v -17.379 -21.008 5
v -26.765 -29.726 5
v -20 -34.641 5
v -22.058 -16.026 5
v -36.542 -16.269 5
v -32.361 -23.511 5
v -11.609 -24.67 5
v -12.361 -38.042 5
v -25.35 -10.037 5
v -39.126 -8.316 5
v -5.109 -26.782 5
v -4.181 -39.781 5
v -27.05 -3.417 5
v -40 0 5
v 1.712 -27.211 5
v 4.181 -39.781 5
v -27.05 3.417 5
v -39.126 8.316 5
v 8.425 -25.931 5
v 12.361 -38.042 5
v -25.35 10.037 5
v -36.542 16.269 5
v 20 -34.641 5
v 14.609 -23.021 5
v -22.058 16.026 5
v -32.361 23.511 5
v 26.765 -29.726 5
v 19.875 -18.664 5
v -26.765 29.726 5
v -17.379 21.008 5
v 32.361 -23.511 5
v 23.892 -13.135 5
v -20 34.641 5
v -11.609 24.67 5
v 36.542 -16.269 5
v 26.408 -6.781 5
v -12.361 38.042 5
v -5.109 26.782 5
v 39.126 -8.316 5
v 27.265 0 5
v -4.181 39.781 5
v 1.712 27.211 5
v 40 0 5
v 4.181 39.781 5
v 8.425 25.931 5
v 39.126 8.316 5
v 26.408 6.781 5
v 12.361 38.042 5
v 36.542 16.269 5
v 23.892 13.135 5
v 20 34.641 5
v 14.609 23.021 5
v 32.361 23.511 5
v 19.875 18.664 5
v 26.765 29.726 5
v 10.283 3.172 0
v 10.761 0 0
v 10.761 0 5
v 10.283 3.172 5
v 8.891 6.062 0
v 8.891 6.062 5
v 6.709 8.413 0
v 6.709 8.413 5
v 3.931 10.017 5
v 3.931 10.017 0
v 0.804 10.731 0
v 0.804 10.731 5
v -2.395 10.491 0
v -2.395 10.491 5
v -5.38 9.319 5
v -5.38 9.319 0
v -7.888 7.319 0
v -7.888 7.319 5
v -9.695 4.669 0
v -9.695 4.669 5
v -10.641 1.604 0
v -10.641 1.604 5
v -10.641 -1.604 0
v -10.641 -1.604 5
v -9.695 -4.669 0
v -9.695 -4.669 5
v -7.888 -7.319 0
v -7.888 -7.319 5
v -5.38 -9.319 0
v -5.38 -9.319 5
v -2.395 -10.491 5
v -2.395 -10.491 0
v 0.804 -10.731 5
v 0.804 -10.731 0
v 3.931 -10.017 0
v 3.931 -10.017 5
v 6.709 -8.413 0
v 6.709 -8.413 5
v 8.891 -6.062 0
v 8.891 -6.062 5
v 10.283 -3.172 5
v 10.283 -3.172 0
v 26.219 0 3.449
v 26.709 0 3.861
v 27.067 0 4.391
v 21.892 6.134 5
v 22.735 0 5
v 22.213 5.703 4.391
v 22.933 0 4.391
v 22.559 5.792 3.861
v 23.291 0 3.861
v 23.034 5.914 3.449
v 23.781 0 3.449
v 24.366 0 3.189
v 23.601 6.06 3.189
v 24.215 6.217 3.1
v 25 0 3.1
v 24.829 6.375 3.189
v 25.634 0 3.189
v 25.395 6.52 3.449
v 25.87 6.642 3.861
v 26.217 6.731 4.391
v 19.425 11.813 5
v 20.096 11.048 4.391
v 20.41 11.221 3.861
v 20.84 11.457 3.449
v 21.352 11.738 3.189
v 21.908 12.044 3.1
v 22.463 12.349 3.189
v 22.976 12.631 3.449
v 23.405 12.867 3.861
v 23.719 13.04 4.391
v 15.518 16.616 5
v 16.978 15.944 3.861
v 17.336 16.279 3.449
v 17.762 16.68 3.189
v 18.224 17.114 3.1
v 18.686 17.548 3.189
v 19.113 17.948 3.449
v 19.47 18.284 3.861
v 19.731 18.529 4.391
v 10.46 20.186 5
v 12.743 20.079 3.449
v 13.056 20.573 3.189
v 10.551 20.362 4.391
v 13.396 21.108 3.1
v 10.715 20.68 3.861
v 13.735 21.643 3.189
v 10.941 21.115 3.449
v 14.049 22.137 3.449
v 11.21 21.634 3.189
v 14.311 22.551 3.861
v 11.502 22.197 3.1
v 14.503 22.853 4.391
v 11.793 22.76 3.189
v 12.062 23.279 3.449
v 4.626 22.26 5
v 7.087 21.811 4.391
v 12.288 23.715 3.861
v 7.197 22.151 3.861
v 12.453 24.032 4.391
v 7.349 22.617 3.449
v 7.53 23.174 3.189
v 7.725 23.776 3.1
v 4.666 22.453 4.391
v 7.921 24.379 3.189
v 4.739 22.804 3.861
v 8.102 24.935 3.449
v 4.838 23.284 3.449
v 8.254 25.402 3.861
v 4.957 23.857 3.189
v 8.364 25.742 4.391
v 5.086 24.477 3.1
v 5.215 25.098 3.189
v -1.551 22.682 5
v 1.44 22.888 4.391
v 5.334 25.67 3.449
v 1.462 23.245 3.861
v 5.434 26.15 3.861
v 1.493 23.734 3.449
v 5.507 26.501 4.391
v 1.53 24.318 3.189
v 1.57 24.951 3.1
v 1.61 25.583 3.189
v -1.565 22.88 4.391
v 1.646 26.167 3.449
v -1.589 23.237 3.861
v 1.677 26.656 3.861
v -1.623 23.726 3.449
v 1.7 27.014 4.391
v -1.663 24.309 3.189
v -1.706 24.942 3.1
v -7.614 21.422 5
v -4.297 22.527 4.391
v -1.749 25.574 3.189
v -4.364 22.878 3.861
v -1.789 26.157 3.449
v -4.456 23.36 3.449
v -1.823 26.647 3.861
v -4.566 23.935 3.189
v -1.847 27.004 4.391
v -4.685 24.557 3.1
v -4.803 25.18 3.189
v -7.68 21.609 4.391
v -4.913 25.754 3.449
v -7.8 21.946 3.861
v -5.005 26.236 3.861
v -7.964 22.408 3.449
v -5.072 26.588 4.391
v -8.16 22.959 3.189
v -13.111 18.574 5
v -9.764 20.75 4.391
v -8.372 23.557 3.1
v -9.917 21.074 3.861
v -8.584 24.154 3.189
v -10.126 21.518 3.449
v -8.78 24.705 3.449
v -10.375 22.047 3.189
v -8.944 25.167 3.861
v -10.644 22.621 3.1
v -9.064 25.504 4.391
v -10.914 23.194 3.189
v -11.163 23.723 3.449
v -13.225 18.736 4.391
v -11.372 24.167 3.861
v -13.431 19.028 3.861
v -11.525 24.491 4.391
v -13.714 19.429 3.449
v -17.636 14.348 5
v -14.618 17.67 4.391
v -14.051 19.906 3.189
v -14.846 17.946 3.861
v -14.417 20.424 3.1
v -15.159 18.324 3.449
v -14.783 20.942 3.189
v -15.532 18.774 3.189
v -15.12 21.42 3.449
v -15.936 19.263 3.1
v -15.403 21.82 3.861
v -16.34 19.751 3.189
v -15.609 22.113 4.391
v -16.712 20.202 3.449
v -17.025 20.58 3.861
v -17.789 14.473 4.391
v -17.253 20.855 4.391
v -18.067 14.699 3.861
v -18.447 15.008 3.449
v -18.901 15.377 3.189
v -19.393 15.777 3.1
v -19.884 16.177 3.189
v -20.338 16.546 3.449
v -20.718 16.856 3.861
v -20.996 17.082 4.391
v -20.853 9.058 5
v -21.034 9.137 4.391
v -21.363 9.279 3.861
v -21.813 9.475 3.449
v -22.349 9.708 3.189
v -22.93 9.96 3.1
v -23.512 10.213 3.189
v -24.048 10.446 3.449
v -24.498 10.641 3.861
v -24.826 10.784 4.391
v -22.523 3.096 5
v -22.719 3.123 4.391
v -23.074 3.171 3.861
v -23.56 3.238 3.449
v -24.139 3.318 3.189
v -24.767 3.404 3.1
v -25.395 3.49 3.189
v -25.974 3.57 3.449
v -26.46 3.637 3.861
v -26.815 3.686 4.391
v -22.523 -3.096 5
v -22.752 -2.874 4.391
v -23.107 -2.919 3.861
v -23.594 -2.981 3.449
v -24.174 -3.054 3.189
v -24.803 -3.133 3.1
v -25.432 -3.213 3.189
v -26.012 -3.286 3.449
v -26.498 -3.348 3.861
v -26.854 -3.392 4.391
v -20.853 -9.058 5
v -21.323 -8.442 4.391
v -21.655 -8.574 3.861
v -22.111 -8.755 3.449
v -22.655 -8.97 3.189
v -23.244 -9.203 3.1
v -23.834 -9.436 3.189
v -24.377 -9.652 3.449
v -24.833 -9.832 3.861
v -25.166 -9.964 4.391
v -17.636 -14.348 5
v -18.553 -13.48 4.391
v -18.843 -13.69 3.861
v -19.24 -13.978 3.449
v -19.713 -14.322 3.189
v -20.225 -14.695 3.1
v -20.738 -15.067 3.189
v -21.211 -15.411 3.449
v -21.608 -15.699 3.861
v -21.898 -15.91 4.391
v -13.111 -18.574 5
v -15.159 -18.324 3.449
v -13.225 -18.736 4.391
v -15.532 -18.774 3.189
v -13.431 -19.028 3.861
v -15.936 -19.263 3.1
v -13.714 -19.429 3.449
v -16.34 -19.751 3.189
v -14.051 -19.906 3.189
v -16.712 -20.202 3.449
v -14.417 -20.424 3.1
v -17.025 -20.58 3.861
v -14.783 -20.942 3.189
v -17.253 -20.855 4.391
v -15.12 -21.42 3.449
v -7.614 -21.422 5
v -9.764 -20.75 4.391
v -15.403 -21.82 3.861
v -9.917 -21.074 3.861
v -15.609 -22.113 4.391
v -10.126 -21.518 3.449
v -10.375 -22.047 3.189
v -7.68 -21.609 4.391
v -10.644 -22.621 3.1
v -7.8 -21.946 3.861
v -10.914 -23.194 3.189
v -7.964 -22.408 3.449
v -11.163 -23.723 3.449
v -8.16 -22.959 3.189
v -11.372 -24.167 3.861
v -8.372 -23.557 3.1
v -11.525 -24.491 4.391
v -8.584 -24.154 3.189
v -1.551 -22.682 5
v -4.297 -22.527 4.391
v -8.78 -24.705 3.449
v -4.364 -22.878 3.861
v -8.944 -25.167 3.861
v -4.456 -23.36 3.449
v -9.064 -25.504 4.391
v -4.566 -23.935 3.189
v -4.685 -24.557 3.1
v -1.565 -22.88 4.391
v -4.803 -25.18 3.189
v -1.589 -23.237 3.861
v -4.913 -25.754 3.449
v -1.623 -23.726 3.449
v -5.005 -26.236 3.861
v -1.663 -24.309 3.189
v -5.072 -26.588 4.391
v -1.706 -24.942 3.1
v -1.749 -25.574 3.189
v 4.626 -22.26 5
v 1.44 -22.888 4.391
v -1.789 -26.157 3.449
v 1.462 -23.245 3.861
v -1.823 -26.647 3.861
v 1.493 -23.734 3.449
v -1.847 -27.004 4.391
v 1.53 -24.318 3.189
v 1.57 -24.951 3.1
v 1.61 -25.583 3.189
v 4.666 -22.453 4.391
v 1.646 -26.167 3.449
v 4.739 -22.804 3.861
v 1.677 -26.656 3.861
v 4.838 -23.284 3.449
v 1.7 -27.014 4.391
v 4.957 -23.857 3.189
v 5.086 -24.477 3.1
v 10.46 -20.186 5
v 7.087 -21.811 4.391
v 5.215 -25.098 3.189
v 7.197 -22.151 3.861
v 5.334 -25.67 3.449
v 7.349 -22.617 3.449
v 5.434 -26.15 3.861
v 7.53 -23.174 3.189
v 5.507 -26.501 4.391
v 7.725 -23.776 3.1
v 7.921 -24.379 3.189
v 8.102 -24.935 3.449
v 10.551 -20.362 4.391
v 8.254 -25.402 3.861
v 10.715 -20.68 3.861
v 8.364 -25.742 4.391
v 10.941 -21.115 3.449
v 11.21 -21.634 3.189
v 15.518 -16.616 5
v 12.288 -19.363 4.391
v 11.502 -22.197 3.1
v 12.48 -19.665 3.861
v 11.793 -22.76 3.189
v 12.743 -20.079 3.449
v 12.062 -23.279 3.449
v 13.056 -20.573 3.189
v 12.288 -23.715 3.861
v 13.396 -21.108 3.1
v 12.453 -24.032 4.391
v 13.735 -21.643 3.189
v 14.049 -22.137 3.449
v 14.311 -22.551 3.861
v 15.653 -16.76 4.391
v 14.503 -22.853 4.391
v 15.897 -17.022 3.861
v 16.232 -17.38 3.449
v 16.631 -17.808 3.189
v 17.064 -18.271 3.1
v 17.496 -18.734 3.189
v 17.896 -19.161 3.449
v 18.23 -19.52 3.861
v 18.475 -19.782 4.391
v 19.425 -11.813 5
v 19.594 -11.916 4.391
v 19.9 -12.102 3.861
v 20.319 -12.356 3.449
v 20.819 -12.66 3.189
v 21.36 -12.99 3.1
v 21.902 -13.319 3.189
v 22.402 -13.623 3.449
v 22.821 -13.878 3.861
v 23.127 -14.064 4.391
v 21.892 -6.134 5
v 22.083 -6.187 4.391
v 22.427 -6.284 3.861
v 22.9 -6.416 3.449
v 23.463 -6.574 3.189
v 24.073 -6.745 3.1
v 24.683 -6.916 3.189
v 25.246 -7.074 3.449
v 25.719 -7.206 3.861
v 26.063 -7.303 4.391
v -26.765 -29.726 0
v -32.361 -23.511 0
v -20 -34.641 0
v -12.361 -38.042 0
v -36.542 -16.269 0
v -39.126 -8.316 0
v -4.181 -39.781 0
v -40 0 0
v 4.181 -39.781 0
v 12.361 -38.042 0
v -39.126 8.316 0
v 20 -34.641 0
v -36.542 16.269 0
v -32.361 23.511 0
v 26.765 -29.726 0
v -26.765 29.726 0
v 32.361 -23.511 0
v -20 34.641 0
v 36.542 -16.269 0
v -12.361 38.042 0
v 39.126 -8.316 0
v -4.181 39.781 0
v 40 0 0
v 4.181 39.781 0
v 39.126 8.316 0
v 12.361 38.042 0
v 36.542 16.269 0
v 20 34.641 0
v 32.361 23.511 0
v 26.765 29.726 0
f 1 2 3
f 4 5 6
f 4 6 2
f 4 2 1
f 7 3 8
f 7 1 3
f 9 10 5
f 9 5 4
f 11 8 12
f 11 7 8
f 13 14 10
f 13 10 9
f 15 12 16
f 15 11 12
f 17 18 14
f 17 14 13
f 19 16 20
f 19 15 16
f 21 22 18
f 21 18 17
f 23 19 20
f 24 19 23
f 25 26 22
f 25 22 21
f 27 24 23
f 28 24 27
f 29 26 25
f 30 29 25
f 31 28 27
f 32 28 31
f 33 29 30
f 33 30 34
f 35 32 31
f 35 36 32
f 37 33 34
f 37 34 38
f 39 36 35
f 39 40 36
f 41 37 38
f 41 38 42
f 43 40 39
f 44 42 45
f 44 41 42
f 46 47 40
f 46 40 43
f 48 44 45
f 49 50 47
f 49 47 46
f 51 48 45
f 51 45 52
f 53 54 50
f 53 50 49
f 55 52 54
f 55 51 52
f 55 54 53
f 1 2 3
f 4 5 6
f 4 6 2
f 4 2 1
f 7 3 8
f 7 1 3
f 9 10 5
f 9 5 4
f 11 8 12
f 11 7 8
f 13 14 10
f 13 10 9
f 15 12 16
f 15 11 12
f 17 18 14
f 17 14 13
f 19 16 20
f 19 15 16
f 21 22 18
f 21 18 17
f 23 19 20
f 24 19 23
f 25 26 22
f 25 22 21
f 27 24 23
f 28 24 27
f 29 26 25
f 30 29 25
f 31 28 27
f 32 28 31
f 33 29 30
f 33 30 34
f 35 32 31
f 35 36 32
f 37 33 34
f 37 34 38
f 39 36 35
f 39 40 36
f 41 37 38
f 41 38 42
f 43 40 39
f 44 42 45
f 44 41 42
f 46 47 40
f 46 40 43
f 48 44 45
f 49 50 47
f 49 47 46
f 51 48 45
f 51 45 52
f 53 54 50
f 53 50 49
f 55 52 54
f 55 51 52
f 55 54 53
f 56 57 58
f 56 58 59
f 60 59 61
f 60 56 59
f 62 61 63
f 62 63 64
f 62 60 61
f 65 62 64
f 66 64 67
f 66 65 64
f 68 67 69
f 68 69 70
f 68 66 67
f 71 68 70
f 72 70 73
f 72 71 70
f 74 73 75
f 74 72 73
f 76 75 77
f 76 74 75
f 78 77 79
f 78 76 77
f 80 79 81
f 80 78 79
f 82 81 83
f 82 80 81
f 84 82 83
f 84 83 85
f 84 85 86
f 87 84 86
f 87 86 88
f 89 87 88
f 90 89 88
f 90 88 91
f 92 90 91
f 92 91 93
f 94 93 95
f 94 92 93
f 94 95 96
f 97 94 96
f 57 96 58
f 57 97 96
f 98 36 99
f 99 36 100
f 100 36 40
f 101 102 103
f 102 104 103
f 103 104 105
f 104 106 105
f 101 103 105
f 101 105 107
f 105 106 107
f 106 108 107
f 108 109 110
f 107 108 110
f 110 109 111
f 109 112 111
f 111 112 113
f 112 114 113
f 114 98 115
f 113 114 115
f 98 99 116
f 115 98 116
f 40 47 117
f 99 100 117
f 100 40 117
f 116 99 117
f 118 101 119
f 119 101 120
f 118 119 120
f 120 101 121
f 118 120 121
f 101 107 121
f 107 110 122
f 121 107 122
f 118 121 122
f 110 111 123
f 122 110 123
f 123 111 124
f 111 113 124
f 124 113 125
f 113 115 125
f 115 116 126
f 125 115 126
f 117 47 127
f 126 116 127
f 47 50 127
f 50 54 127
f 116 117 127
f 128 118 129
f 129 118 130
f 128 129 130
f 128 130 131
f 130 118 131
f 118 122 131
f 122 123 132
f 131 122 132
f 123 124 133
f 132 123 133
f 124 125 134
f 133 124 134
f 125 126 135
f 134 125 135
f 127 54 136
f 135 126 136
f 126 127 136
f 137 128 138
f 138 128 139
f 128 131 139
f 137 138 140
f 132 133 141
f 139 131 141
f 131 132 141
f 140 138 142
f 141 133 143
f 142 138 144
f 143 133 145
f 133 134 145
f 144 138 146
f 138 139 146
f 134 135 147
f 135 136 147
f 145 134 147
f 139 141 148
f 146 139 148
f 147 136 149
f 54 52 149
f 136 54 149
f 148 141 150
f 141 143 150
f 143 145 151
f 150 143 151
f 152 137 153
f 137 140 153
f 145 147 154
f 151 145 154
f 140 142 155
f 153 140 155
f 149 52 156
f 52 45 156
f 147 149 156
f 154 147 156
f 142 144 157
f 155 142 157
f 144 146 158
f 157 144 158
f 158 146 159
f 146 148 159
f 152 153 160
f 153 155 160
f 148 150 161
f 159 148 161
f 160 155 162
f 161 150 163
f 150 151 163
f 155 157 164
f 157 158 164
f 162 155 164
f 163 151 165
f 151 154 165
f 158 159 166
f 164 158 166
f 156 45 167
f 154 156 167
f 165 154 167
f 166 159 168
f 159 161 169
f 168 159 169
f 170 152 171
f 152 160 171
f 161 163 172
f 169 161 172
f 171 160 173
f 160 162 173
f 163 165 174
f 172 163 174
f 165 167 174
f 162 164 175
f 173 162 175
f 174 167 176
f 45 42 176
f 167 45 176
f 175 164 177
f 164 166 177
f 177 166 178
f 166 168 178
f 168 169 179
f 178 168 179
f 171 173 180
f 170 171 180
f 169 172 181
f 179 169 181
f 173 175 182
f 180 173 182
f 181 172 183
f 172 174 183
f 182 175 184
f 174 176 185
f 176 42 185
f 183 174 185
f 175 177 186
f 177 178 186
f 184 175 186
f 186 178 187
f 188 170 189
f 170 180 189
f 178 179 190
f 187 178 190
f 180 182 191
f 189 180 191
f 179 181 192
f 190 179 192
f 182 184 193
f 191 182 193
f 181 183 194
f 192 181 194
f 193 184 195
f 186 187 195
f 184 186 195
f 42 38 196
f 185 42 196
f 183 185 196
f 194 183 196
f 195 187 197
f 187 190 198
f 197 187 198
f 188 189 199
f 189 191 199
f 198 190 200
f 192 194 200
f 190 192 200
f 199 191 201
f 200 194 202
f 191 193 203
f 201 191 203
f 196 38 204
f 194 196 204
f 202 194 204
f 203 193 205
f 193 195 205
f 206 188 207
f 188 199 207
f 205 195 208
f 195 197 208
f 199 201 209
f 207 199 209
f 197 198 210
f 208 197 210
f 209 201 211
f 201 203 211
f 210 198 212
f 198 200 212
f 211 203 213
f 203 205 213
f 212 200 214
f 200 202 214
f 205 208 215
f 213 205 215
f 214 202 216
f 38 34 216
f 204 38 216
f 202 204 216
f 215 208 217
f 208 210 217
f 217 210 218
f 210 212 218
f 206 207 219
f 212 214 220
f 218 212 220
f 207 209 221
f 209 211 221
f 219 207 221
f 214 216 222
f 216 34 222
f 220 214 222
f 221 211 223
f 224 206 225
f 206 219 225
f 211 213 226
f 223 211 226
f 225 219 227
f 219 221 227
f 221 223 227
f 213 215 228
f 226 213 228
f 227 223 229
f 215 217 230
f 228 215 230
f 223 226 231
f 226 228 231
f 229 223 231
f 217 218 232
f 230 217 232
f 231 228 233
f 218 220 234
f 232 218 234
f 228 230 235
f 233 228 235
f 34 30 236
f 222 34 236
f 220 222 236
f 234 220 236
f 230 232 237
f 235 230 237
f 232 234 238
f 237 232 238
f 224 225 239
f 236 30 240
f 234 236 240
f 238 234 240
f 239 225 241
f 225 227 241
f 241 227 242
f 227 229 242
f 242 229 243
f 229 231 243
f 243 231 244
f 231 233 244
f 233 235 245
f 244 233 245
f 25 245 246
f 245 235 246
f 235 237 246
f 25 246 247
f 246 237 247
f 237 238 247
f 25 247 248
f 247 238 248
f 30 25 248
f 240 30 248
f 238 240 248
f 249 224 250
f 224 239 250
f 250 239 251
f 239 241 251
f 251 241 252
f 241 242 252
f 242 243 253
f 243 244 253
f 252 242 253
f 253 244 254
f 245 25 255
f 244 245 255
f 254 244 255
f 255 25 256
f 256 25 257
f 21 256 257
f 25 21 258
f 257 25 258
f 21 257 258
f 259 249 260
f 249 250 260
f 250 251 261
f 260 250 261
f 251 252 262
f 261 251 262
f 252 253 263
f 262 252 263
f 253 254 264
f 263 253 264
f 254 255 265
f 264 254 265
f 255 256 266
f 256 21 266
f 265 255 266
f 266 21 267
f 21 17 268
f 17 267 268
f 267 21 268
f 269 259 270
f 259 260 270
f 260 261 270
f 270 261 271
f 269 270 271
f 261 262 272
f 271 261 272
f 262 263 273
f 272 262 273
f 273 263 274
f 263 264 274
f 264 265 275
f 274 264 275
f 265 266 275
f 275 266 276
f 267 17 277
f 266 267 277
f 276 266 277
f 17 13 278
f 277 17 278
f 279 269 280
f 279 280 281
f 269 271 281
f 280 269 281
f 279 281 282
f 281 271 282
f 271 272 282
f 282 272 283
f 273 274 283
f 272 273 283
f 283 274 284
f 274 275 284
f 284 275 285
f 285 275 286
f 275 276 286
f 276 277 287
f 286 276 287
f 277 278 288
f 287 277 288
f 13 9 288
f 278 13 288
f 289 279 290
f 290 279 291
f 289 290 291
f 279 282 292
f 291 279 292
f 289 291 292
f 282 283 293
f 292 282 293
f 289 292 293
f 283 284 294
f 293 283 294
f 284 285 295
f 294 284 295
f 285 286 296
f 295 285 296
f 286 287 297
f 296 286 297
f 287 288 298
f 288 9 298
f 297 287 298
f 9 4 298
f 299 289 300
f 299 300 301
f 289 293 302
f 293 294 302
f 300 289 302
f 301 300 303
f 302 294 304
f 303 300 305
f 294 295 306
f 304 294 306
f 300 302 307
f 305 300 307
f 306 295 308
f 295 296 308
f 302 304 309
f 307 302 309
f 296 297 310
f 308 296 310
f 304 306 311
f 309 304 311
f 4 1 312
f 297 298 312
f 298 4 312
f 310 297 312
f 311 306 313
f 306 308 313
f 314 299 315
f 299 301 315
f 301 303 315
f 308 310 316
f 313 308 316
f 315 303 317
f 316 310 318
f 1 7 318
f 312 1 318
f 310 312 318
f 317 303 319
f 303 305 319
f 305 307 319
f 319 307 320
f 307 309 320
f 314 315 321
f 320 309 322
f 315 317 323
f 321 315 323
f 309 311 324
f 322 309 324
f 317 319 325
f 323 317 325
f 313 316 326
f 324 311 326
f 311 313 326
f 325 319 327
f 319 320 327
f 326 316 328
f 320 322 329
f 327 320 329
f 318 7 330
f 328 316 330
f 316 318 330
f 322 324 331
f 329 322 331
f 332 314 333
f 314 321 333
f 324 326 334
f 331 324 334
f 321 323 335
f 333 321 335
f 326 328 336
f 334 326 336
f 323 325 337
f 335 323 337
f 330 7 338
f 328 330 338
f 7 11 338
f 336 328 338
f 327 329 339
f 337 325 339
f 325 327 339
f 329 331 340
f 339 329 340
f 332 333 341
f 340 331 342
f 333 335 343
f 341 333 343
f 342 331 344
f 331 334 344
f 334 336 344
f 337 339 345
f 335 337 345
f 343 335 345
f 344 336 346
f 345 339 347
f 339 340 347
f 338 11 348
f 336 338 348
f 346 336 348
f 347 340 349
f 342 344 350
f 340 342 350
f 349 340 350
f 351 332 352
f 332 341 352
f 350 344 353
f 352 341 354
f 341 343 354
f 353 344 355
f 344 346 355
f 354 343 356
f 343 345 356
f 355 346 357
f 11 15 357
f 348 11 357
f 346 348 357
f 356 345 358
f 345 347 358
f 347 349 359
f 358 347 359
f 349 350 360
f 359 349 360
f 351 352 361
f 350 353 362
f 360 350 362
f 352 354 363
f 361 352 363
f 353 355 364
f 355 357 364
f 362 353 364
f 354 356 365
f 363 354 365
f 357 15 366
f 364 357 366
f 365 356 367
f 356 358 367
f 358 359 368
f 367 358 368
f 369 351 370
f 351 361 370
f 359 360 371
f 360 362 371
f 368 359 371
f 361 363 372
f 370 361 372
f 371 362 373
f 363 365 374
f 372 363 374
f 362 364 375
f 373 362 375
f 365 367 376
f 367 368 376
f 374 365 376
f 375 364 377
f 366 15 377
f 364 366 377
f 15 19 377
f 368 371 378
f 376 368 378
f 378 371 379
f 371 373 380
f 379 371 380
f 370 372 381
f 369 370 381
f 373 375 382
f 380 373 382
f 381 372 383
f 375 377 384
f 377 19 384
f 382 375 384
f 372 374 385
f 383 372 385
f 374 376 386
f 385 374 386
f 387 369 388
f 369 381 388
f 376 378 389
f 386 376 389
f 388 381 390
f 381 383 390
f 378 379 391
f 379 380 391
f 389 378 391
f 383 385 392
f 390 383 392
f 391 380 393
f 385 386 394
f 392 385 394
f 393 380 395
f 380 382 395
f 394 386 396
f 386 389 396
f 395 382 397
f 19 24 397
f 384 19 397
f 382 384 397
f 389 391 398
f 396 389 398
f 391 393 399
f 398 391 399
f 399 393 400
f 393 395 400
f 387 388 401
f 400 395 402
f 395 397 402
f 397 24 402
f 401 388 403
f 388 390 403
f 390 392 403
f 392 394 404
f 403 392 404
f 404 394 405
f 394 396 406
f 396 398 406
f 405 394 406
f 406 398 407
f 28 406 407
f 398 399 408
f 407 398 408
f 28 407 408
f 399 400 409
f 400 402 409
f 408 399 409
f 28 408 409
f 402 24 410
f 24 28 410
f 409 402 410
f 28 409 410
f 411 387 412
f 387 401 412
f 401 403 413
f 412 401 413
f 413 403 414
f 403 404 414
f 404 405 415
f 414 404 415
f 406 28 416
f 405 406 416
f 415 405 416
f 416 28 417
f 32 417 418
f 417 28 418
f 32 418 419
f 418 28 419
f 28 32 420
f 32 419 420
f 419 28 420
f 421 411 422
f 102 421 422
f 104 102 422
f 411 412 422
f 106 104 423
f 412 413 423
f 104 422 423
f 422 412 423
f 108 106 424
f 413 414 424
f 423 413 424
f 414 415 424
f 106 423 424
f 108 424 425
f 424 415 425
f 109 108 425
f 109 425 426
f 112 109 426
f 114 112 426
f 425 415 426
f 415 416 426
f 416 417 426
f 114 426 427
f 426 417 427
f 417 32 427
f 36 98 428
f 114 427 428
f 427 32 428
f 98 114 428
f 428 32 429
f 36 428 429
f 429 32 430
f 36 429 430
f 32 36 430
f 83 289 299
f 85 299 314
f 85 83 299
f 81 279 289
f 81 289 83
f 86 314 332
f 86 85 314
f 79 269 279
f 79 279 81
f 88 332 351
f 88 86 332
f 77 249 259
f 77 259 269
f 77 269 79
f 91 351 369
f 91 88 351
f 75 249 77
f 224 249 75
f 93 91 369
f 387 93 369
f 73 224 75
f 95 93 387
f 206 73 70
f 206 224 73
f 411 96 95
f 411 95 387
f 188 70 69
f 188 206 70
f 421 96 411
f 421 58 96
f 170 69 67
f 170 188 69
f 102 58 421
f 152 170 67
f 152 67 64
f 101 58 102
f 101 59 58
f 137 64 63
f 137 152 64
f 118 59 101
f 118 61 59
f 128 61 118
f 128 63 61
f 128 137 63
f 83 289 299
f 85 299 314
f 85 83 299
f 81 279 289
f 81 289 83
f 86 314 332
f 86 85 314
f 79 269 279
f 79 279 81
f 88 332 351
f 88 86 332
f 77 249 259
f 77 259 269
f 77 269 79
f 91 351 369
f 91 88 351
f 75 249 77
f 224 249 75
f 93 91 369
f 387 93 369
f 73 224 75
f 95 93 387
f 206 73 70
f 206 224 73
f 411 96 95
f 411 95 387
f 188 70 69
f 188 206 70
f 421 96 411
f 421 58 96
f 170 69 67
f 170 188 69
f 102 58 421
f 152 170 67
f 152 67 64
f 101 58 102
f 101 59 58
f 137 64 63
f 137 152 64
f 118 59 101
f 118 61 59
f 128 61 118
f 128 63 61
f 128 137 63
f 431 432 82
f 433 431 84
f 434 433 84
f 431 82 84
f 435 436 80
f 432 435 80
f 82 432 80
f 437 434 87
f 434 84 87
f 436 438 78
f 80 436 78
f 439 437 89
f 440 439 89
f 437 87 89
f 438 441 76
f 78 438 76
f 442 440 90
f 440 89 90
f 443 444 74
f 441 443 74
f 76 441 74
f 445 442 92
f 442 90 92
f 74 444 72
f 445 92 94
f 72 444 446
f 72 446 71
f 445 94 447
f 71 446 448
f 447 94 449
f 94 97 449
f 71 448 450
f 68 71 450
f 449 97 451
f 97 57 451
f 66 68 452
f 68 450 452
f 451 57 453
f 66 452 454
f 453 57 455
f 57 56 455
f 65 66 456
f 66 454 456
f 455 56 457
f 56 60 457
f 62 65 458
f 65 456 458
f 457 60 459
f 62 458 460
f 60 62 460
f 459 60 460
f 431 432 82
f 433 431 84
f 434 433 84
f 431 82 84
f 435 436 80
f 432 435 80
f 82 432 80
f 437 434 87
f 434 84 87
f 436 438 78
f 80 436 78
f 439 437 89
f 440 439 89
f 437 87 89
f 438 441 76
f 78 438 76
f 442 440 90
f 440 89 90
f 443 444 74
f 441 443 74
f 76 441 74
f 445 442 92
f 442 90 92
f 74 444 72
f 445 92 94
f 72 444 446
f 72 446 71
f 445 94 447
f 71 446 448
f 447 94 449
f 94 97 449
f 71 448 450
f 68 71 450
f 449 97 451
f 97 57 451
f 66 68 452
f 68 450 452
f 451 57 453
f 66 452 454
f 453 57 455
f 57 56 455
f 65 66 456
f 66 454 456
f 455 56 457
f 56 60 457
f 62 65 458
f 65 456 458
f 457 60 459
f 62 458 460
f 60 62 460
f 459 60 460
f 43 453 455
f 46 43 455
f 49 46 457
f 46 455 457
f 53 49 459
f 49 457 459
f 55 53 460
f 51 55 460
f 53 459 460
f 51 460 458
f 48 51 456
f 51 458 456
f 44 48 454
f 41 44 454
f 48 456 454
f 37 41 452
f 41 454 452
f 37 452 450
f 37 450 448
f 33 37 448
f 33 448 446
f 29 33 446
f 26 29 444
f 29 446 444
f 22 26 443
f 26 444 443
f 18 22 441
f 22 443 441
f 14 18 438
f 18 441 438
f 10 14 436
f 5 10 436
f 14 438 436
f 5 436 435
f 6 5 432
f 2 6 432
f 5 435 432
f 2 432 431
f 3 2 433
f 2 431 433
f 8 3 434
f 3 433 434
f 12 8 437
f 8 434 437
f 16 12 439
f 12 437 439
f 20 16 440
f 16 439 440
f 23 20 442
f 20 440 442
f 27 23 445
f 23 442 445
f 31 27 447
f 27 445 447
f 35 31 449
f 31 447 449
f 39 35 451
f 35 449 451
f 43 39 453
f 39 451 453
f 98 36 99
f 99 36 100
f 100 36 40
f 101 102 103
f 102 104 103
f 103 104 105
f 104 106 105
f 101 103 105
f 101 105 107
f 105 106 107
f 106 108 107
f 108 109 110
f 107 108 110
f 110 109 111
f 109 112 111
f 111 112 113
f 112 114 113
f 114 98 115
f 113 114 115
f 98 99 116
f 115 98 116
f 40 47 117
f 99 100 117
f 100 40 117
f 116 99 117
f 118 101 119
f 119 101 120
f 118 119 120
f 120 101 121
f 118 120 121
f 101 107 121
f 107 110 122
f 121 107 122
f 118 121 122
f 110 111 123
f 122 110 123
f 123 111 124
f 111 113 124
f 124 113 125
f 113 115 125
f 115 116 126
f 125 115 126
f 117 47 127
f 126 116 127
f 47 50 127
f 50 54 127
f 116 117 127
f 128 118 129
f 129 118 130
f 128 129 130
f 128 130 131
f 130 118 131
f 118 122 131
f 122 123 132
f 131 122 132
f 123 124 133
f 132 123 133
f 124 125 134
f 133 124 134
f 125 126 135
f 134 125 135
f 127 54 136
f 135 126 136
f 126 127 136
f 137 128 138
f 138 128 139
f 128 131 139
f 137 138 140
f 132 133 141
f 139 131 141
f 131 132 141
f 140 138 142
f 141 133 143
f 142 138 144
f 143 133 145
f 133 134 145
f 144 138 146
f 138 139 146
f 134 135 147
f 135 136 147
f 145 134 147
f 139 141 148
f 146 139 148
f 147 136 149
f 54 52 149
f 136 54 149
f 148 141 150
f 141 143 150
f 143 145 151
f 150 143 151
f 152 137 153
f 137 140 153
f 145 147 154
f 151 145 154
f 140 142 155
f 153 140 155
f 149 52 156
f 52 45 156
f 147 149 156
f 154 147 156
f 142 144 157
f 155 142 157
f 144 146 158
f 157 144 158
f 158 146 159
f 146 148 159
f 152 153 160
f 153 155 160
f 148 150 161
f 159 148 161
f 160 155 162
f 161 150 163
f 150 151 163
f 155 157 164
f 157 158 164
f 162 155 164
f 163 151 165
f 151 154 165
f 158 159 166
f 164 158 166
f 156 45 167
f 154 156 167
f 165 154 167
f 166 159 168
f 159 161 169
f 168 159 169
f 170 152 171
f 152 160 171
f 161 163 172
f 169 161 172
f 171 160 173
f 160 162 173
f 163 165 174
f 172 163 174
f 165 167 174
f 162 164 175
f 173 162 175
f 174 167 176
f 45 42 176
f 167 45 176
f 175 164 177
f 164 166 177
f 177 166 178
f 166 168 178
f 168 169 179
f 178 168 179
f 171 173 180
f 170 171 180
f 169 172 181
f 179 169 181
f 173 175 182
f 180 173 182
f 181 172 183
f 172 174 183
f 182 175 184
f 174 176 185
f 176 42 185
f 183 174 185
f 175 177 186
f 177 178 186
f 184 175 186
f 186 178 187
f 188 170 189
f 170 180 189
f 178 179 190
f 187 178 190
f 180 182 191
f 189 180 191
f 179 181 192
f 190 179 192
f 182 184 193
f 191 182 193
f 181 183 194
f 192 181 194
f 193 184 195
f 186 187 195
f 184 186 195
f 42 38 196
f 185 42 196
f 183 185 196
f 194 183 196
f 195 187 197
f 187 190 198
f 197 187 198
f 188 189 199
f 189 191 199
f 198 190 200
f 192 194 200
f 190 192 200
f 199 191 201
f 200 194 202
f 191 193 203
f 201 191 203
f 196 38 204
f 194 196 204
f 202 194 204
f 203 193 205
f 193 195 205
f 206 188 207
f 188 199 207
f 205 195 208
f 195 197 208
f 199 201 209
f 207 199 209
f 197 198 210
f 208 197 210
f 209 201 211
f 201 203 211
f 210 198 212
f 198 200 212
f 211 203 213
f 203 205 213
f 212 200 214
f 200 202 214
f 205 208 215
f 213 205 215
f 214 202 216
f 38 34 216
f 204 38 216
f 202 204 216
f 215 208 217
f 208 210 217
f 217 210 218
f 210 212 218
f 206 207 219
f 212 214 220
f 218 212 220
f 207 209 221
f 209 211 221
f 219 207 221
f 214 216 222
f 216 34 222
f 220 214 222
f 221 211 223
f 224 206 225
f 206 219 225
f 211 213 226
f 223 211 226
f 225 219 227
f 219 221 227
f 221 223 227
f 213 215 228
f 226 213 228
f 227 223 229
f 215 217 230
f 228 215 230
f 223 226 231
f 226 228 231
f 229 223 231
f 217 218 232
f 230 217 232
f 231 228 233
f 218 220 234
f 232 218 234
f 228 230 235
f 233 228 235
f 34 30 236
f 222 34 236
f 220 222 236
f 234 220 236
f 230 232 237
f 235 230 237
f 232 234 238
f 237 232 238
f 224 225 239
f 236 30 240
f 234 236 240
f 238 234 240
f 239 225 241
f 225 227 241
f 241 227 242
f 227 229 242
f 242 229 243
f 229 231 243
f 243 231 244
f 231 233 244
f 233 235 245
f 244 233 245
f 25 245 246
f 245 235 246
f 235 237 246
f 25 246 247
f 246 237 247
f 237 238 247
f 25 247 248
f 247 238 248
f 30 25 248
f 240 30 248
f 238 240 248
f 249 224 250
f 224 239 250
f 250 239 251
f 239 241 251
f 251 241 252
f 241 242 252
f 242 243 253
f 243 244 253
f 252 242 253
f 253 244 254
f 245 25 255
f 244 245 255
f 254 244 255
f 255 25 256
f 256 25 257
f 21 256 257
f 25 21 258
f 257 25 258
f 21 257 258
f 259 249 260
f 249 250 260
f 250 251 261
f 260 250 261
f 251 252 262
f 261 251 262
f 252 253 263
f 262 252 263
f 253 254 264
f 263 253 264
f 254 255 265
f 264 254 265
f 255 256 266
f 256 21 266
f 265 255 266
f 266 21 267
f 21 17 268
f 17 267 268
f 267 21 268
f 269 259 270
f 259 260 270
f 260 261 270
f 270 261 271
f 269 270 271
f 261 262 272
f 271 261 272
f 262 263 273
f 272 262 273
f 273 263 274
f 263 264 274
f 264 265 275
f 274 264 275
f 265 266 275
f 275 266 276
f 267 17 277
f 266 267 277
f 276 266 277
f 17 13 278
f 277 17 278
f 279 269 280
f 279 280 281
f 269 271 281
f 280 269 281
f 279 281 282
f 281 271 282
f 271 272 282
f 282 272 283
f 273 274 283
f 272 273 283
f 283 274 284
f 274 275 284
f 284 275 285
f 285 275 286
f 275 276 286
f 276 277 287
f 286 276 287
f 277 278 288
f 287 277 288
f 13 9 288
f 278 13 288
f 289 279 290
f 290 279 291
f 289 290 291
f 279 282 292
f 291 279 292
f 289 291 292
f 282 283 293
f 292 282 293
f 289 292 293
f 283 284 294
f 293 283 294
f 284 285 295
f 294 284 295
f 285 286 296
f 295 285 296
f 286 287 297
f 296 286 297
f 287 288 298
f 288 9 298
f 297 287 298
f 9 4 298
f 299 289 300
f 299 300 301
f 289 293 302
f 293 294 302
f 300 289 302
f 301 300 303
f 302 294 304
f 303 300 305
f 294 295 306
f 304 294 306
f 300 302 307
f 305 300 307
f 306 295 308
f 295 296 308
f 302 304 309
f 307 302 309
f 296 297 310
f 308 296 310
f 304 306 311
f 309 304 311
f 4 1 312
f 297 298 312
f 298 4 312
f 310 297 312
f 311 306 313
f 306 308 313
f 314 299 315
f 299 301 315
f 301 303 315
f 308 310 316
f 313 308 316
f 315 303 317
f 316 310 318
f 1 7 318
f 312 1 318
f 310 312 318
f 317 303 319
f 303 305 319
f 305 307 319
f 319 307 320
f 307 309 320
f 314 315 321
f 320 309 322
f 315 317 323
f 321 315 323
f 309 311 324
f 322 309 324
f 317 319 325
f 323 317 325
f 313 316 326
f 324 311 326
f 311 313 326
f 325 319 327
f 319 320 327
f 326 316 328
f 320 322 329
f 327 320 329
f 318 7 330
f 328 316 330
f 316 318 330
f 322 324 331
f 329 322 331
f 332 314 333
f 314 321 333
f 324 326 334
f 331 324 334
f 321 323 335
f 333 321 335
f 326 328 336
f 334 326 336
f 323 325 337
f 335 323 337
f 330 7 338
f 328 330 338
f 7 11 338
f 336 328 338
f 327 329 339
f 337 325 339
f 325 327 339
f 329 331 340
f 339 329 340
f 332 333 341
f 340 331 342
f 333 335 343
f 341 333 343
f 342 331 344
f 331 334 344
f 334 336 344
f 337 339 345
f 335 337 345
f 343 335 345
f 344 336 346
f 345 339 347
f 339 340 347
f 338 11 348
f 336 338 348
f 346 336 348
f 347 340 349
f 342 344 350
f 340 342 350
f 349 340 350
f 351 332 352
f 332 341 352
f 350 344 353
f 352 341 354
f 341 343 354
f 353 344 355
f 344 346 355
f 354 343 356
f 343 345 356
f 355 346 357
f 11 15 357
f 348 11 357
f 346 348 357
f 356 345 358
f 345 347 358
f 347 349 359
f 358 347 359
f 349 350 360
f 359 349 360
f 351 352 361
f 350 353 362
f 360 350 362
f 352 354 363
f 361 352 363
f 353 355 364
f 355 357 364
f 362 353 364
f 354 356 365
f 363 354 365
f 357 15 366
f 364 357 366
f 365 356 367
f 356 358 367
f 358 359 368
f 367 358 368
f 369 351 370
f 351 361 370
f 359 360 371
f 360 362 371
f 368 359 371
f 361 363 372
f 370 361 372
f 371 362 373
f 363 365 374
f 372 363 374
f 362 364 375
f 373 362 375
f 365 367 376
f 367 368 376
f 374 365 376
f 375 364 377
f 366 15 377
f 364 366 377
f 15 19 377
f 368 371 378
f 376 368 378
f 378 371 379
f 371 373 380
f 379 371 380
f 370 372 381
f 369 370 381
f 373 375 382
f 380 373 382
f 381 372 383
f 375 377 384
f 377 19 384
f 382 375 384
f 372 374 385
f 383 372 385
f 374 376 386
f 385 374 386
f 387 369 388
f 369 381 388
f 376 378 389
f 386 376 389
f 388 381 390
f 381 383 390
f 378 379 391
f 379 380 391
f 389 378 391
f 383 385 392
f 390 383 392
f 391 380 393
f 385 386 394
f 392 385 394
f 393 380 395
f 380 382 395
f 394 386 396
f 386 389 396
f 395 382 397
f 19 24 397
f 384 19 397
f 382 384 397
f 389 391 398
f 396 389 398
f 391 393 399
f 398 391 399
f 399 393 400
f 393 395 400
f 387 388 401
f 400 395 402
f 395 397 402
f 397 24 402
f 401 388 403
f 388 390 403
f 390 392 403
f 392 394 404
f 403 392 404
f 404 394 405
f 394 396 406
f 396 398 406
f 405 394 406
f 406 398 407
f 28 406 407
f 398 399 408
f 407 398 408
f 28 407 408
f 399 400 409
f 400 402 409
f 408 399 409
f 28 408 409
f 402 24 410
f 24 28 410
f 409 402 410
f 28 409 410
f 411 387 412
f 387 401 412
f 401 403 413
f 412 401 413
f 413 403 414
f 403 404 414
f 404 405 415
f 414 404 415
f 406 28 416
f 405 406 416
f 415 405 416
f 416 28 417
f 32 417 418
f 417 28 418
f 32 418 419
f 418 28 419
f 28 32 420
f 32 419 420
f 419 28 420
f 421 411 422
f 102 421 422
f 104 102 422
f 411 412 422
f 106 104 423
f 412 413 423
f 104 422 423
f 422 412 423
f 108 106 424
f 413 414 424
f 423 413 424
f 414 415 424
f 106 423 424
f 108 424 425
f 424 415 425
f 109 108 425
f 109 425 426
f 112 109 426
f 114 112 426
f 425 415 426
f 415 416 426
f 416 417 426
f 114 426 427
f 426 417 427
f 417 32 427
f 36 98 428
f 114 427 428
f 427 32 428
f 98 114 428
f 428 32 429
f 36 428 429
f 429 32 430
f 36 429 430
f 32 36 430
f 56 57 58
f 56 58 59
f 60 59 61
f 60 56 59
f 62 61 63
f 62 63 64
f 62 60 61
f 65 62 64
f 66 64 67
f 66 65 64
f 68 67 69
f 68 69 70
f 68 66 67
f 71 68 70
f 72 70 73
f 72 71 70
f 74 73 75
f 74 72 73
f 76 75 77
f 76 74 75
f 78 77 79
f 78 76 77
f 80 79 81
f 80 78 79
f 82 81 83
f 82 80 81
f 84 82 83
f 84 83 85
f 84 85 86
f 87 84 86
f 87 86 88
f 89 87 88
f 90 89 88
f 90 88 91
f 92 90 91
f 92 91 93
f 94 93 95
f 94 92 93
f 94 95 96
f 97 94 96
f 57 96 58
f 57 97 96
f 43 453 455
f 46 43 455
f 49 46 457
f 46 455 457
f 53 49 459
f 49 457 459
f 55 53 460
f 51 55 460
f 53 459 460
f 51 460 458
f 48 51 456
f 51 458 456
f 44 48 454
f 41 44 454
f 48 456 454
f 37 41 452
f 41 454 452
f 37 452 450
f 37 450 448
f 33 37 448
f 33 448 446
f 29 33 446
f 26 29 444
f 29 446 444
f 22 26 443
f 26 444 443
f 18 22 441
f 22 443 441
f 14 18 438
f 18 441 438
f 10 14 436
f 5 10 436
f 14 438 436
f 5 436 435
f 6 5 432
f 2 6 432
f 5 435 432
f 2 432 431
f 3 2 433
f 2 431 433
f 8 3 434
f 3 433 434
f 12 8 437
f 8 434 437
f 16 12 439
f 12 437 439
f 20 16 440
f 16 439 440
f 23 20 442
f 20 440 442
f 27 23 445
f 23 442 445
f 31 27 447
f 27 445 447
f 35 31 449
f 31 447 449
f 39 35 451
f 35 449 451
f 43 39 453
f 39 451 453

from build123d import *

# Parameters (mm, degrees)
SKETCH003_AS_DRAWN_R                 = 2.3
REVOLVE_ONTO_SKETCH003_ROLL_ANGLE    = 90
SKETCH005_R                          = 10.760963
EXTRUDE_DEPTH                        = 5
SKETCH004_R                          = 40
PAD001_DEPTH                         = 5
SKETCH006_AS_DRAWN_R                 = 2.3
REVOLVE001_ONTO_SKETCH006_ROLL_ANGLE = 90
SKETCH007_R                          = 10.760963
EXTRUDE001_DEPTH                     = 5
SKETCH008_R                          = 40
PAD002_DEPTH                         = 5


with BuildPart() as revolve_body:
    # Sketch003 as drawn → Revolve (revolve)
    with BuildSketch(Plane.XY):
        with Locations((25, 5.4)):
            Circle(SKETCH003_AS_DRAWN_R)
    revolve(axis=Axis((0, 0, 0), (0, 1, 0)))


with BuildPart() as revolve_body_1:
    # Revolve onto Sketch003 roll: moved
    add(revolve_body.part.rotate(Axis((0, 0, 0), (1, 0, 0)), REVOLVE_ONTO_SKETCH003_ROLL_ANGLE))


with BuildPart() as revolve_body_2:
    # Revolve onto Sketch003 placement: moved
    add(revolve_body_1.part)


with BuildPart() as hub_hole_ex:
    # Sketch005 → Extrude (new body)
    with BuildSketch(Plane.XY):
        Circle(SKETCH005_R)
    extrude(amount=EXTRUDE_DEPTH)


with BuildPart() as top001:
    # Sketch004 → Pad001 (new body)
    with BuildSketch(Plane.XY):
        Circle(SKETCH004_R)
    extrude(amount=PAD001_DEPTH)

    # Cut001: cut hub_hole_ex
    add(hub_hole_ex.part, mode=Mode.SUBTRACT)

    # Cut002: cut Revolve body
    add(revolve_body_2.part, mode=Mode.SUBTRACT)


with BuildPart() as revolve001:
    # Sketch006 as drawn → Revolve001 (revolve)
    with BuildSketch(Plane.XY):
        with Locations((25, 5.4)):
            Circle(SKETCH006_AS_DRAWN_R)
    revolve(axis=Axis((0, 0, 0), (0, 1, 0)))


with BuildPart() as revolve001_1:
    # Revolve001 onto Sketch006 roll: moved
    add(revolve001.part.rotate(Axis((0, 0, 0), (1, 0, 0)), REVOLVE001_ONTO_SKETCH006_ROLL_ANGLE))


with BuildPart() as revolve001_2:
    # Revolve001 onto Sketch006 placement: moved
    add(revolve001_1.part)


with BuildPart() as hub_hole_ex001:
    # Sketch007 → Extrude001 (new body)
    with BuildSketch(Plane.XY):
        Circle(SKETCH007_R)
    extrude(amount=EXTRUDE001_DEPTH)


with BuildPart() as top004:
    # Sketch008 → Pad002 (new body)
    with BuildSketch(Plane.XY):
        Circle(SKETCH008_R)
    extrude(amount=PAD002_DEPTH)

    # Cut003: cut hub_hole_ex001
    add(hub_hole_ex001.part, mode=Mode.SUBTRACT)

    # Cut004: cut Revolve001
    add(revolve001_2.part, mode=Mode.SUBTRACT)


solid = Compound([top001.part, top004.part])
